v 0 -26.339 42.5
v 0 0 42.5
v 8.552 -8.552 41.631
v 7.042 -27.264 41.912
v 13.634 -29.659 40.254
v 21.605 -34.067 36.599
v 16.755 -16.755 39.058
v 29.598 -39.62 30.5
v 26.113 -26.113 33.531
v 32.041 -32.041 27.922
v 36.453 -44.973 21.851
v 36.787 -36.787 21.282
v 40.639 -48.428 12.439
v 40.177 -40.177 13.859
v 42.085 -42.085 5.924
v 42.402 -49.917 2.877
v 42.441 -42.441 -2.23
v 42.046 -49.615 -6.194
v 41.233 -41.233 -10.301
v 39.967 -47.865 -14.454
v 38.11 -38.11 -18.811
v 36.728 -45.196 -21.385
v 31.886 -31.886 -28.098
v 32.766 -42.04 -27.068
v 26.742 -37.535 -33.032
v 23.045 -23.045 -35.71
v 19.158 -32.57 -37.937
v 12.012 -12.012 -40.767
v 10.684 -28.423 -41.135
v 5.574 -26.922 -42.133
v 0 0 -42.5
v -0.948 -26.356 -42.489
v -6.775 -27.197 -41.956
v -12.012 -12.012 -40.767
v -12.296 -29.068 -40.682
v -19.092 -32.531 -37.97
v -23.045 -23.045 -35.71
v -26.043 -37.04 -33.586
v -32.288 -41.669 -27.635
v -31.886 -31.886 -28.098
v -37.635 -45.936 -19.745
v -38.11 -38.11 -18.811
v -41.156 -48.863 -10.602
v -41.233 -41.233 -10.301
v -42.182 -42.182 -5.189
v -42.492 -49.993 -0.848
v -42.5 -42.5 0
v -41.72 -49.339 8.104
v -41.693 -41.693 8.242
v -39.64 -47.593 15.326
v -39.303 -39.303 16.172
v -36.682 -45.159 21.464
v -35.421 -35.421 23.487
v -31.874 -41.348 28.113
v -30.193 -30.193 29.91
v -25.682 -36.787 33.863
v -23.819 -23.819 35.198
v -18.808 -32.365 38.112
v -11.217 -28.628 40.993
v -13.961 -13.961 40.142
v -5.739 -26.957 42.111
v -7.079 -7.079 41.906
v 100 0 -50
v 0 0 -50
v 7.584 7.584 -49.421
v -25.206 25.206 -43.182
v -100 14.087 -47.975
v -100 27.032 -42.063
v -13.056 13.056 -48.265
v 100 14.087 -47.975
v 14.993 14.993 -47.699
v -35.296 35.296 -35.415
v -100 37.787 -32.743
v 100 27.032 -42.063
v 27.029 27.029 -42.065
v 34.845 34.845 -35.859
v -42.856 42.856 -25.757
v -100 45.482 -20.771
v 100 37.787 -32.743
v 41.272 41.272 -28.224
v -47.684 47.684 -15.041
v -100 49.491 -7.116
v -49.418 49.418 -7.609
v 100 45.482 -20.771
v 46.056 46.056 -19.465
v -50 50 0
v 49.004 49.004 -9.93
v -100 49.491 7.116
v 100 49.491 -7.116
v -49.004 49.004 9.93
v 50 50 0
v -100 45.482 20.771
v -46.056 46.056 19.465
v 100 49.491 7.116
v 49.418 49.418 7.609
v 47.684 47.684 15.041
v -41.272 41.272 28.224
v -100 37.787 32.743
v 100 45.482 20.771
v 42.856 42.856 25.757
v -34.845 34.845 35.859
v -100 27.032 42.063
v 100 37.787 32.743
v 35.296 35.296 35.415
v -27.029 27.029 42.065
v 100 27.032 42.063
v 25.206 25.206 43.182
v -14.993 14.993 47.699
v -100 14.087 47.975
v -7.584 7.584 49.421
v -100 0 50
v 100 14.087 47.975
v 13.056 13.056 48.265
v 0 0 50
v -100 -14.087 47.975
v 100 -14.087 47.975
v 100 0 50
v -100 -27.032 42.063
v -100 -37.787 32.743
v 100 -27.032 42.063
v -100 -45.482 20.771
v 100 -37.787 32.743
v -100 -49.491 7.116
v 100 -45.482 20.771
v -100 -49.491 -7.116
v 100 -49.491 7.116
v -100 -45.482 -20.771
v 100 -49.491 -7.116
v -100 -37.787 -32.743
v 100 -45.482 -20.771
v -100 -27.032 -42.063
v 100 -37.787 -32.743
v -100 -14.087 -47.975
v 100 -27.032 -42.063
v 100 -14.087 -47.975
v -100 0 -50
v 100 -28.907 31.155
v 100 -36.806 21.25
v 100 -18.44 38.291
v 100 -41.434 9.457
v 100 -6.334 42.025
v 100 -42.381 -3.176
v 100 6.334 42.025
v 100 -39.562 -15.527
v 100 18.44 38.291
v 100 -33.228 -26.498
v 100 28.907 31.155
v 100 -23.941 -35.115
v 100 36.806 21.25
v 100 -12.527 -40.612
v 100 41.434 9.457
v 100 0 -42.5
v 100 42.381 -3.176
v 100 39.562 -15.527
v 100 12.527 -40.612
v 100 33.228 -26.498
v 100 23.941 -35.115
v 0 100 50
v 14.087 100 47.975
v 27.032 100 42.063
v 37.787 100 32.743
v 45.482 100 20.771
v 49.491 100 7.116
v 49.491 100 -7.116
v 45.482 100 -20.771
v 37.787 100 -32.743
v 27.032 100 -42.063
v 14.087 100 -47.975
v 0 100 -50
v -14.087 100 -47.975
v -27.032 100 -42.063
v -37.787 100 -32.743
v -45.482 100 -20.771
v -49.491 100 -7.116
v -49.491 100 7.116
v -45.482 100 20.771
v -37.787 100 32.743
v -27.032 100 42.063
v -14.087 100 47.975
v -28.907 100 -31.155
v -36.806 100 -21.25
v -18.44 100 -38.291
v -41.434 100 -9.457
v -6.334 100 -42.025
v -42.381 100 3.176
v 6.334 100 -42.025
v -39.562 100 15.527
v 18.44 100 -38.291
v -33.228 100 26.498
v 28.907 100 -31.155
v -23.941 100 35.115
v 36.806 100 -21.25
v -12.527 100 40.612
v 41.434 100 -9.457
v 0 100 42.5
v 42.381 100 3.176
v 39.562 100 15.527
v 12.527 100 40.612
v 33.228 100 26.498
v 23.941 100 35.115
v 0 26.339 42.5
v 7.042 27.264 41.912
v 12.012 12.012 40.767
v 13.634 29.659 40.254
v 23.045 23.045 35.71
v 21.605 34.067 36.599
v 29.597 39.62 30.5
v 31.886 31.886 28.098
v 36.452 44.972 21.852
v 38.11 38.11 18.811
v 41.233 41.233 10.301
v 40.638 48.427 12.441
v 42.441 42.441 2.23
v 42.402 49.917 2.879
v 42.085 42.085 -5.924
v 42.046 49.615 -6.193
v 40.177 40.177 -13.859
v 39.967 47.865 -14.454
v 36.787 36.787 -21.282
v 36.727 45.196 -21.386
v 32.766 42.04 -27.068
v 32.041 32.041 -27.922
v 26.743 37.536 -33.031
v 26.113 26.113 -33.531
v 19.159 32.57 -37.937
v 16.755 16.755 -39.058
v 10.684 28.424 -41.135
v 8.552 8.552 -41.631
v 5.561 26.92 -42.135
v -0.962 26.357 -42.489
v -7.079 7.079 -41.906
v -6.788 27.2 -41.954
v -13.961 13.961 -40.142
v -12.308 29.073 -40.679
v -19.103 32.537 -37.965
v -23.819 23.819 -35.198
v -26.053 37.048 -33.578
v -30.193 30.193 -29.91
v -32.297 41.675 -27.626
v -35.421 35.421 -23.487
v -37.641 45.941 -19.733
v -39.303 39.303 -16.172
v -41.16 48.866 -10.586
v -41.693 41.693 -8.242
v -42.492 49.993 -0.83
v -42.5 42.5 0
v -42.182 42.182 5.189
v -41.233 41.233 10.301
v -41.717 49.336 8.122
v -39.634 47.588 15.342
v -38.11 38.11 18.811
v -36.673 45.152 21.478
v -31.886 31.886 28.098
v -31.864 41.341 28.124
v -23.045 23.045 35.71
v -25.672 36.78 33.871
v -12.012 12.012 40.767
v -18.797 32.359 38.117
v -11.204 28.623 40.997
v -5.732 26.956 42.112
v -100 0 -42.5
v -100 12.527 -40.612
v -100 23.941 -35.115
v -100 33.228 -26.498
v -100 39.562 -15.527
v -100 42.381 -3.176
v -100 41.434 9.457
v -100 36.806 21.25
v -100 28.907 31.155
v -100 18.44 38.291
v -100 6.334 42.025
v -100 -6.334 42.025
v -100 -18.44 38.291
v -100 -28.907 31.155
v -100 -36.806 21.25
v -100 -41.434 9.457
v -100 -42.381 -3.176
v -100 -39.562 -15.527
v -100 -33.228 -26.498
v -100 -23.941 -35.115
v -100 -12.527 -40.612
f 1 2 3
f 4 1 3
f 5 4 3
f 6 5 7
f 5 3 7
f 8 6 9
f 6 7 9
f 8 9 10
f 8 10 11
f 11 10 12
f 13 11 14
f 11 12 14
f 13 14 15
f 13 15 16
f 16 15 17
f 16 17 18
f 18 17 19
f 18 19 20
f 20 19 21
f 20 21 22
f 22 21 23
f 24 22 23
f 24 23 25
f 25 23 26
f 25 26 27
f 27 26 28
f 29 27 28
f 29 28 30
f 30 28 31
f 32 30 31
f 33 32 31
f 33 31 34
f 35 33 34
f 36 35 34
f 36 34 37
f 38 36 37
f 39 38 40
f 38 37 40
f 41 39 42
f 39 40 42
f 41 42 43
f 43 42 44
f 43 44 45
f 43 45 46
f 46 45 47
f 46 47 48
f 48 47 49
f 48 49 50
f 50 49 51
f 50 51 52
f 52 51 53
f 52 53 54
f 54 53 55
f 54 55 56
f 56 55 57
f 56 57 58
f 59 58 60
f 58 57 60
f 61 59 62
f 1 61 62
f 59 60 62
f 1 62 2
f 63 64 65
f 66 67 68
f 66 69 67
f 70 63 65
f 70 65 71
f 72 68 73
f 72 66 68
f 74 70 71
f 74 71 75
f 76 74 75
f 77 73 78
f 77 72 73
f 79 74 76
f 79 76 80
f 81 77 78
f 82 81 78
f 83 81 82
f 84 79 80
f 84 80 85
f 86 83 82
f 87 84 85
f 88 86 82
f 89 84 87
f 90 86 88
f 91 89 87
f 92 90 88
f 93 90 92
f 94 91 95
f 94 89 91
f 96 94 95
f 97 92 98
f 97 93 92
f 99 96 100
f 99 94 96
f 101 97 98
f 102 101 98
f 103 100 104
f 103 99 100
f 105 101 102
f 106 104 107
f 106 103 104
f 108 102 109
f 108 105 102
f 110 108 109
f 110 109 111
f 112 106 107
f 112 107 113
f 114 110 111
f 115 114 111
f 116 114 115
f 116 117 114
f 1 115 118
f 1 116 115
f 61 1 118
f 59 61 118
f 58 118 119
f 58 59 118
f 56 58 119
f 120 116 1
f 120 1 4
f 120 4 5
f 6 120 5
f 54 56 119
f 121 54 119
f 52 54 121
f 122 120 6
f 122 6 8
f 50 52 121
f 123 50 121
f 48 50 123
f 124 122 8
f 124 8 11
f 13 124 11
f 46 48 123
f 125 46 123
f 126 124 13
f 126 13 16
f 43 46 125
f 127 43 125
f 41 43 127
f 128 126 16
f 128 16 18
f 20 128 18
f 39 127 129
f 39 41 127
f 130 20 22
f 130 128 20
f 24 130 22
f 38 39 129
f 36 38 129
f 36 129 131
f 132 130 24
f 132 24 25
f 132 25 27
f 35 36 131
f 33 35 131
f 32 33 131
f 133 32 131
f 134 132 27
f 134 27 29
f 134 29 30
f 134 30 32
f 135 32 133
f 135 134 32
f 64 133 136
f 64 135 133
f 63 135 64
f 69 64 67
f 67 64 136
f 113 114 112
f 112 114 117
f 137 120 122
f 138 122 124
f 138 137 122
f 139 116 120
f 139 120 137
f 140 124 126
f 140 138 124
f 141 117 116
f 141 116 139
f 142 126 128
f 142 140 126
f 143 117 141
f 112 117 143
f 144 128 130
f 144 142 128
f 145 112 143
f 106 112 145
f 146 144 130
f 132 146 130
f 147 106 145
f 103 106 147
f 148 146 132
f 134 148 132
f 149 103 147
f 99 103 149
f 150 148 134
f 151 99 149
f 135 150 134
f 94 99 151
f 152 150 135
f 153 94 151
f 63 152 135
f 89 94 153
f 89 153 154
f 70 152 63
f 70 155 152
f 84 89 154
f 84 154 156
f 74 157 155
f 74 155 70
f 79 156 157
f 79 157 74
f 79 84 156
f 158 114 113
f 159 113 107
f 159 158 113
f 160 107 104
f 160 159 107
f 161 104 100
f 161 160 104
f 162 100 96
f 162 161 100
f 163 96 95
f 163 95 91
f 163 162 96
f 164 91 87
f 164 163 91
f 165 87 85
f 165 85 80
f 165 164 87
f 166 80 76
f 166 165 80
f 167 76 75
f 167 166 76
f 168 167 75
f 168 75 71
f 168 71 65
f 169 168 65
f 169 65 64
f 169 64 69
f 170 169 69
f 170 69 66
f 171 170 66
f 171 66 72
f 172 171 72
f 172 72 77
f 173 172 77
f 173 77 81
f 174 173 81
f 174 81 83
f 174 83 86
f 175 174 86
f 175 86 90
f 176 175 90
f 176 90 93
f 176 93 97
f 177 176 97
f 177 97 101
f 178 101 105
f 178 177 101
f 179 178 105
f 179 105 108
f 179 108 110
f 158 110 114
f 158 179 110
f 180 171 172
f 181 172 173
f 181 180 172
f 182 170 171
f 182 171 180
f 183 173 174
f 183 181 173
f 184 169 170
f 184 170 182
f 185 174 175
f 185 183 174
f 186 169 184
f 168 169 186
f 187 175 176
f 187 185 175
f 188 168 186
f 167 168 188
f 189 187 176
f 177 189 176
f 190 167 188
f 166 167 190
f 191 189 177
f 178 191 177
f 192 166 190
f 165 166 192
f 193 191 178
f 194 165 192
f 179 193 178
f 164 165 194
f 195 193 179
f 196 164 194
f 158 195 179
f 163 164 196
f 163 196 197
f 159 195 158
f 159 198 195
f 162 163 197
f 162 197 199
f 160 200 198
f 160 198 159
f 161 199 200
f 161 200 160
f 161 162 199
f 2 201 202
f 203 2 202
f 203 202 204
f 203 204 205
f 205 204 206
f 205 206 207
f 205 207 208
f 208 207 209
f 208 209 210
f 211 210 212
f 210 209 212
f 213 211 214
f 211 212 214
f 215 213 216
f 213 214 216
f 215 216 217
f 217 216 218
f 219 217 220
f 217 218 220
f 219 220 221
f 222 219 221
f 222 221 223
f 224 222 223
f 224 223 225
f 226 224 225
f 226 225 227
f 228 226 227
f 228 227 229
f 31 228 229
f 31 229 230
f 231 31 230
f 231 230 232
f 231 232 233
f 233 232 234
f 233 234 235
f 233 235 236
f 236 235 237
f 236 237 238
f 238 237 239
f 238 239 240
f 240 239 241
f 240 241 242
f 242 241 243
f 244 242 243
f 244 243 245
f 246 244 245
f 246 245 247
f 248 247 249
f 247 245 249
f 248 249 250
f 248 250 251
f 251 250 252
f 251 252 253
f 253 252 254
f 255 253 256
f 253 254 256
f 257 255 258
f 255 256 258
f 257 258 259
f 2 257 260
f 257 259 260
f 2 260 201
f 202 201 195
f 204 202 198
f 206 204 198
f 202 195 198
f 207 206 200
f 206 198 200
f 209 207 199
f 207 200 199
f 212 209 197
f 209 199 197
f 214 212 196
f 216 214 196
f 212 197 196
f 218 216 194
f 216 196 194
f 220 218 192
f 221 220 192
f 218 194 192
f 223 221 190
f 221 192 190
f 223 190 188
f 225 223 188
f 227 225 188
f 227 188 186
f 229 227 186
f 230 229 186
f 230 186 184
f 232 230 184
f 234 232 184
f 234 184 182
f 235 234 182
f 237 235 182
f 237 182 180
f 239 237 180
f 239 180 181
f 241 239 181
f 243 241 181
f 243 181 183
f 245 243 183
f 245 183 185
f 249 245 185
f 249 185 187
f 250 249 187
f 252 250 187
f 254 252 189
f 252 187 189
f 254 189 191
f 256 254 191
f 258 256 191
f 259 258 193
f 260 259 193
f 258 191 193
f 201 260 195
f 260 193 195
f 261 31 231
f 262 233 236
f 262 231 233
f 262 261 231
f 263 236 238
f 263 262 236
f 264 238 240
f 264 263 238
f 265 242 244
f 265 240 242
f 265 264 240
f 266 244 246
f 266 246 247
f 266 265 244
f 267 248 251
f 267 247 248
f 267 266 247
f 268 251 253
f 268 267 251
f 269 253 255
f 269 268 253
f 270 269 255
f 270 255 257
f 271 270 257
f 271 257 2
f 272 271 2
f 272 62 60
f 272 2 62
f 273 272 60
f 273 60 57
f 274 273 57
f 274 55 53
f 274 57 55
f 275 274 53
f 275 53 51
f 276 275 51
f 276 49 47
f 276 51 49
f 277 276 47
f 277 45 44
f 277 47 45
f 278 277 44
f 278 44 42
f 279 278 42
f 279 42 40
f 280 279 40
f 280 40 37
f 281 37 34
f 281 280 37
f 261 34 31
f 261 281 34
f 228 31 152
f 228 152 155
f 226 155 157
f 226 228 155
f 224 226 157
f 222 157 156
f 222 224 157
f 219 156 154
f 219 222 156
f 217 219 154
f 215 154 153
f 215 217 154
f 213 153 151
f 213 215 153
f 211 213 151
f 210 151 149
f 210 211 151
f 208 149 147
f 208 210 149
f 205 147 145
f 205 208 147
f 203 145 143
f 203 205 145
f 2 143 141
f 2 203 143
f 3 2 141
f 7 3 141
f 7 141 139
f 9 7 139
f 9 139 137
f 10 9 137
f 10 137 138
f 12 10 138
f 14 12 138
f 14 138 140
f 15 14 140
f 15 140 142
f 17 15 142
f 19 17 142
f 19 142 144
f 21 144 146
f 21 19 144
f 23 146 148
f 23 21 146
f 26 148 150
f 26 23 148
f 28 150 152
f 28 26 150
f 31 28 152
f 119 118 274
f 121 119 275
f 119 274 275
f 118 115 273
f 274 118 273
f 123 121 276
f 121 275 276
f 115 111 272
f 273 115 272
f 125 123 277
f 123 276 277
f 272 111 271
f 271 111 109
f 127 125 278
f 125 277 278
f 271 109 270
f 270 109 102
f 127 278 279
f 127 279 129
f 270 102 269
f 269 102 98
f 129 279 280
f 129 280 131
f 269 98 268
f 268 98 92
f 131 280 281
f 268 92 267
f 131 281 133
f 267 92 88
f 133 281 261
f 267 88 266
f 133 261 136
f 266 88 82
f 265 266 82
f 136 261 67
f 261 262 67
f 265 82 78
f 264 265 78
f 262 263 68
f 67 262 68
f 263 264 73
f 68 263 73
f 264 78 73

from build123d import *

# Parameters (mm, degrees)
SKETCH_1_R           = 50
SKETCH_1_R_2         = 42.5
EXTRUDE_1_DEPTH      = 50
SKETCH_1_2_R         = 50
SKETCH_1_2_R_2       = 42.5
EXTRUDE_2_DEPTH      = 100
EXTRUDE_3_REACH      = 189.083
EXTRUDE_3_END_RADIUS = 50
SKETCH_2_R           = 50
SKETCH_2_R_2         = 42.5
SKETCH_3_R           = 42.5
CUT_EXTRUDE_1_DEPTH  = 200
SKETCH_3_2_R         = 42.5
CUT_EXTRUDE_2_DEPTH  = 100


with BuildPart() as part:
    # 草图1 → 凸台-拉伸1 (new, symmetric)
    with BuildSketch(Plane(origin=(0, 0, 0), x_dir=(0, 0, -1), z_dir=(1, 0, 0))):
        Circle(SKETCH_1_R)
        Circle(SKETCH_1_R_2, mode=Mode.SUBTRACT)
    extrude(amount=EXTRUDE_1_DEPTH, both=True)

    # 草图1<2> → 凸台-拉伸2 (add, symmetric)
    with BuildSketch(Plane(origin=(0, 0, 0), x_dir=(0, 0, -1), z_dir=(1, 0, 0))):
        Circle(SKETCH_1_2_R)
        Circle(SKETCH_1_2_R_2, mode=Mode.SUBTRACT)
    extrude(amount=EXTRUDE_2_DEPTH, both=True)

    # 凸台-拉伸3: up to this cylinder (the profile starts outside it)
    extrude_3_end = Plane(origin=(0, 0, 0), z_dir=(-1, 0, 0)) * Cylinder(EXTRUDE_3_END_RADIUS, 479.166, mode=Mode.PRIVATE)
    # 草图2 → 凸台-拉伸3 (add, up to the surface)
    with BuildSketch(Plane(origin=(0, 100, 0), x_dir=(1, 0, 0), z_dir=(0, 1, 0)), mode=Mode.PRIVATE) as extrude_3_sk1:
        with Locations(Location((0, 0, 0), (0, 0, 270))):
            Circle(SKETCH_2_R)
        with Locations(Location((0, 0, 0), (0, 0, 270))):
            Circle(SKETCH_2_R_2, mode=Mode.SUBTRACT)
    extrude_3_tool1 = extrude(extrude_3_sk1.sketch, amount=-EXTRUDE_3_REACH, mode=Mode.PRIVATE) - extrude_3_end
    add(extrude_3_tool1.solids().sort_by_distance((0, 100, -48.585786))[0])

    # 草图3 → 切除-拉伸1 (cut)
    with BuildSketch(Plane(origin=(0, 0, 0), x_dir=(1, 0, 0), z_dir=(0, 1, 0))):
        with Locations(Location((0, 0, 0), (0, 0, 270))):
            Circle(SKETCH_3_R)
    extrude(amount=-CUT_EXTRUDE_1_DEPTH, mode=Mode.SUBTRACT)

    # 草图3<2> → 切除-拉伸2 (cut, symmetric)
    with BuildSketch(Plane(origin=(0, 0, 0), x_dir=(1, 0, 0), z_dir=(0, 1, 0))):
        with Locations(Location((0, 0, 0), (0, 0, 270))):
            Circle(SKETCH_3_2_R)
    extrude(amount=CUT_EXTRUDE_2_DEPTH, both=True, mode=Mode.SUBTRACT)


solid = part.part
